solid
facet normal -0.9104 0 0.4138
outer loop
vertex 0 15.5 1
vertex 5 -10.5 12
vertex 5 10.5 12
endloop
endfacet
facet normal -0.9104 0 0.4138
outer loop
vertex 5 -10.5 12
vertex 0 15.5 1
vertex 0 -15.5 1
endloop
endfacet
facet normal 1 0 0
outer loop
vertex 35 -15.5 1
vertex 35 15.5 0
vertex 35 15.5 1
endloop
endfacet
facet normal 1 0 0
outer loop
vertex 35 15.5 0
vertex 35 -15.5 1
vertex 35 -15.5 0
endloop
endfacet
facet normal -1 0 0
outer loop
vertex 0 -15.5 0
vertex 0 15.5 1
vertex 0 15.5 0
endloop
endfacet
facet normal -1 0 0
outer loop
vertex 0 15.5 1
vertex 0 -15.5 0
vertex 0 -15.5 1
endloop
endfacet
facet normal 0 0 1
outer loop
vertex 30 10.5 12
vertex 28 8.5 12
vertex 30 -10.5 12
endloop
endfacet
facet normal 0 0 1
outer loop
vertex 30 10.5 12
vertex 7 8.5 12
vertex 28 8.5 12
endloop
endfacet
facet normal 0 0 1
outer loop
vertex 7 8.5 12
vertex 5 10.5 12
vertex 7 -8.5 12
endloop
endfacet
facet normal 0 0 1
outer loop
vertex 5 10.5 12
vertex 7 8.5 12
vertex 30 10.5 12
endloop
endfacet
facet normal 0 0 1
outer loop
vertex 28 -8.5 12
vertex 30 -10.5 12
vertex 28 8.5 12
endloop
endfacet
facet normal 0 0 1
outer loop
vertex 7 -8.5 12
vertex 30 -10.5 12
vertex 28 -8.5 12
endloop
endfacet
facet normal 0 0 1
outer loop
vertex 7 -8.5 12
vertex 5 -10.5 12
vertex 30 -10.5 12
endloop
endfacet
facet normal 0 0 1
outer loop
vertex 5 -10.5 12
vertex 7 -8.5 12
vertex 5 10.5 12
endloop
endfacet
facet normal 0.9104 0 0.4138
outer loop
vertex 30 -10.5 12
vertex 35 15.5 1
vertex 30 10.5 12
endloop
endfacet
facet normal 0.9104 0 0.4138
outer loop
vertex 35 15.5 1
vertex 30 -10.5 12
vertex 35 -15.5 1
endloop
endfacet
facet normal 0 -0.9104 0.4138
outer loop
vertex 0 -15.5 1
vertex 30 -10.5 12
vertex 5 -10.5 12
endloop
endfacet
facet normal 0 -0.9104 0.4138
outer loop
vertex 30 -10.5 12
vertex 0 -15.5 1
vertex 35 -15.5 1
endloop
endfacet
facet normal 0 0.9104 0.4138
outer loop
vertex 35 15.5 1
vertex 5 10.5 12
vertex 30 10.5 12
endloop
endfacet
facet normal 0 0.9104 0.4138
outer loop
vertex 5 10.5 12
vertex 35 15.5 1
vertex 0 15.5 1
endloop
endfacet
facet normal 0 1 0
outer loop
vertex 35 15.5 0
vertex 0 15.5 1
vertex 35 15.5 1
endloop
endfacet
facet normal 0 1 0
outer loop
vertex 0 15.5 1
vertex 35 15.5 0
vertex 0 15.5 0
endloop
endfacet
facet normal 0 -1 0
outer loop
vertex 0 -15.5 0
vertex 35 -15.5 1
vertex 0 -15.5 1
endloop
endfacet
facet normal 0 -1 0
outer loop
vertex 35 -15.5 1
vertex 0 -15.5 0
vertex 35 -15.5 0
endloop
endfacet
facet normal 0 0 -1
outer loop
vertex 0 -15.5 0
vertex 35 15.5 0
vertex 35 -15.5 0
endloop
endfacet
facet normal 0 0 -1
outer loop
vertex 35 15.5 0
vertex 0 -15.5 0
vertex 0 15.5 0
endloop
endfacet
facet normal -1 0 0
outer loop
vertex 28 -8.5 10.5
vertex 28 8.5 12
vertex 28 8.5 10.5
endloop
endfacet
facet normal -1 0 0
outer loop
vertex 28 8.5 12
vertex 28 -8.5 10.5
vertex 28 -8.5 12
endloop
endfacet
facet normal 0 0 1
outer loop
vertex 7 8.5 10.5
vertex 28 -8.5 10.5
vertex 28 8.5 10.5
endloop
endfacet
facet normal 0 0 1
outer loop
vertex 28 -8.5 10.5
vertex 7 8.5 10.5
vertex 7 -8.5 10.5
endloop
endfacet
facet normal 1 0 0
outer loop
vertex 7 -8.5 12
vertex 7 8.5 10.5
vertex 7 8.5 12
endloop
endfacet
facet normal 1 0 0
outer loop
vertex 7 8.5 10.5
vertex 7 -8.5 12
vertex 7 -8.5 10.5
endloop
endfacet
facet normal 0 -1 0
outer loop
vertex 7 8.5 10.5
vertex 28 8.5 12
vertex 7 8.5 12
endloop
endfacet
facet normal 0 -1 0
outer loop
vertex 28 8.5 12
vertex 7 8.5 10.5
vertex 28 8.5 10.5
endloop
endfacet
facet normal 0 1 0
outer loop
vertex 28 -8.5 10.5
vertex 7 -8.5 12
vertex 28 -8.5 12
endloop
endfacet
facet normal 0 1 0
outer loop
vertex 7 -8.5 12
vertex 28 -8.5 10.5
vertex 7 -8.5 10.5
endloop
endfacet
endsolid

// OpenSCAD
//
// This is a trivial thing for now, not even worth putting into repository.
// But we do it anyway, mostly out of habit.
//

riser_l = 21.0;    // X - inside size
riser_w = 17.0;    // Y - inside size
riser_h = 12.0;    // Z - very tall

// We make the indent just deep enough that the machine rests on the feet,
// not on the surrounding plastic. This isolates vibrations at least somewhat.
// Also, we don't know if the plastic around feet is level or strong enough.
riser_depth =  1.5;

module riser () {
    top_w = riser_w + 4.0;      // Make borders
    top_l = riser_l + 4.0;
    bottom_w = top_w + 10.0;    // Make the pyramid
    bottom_l = top_l + 10.0;

    difference () {
        // The outside pyramid
        hull () {
            translate([(bottom_l - top_l)/2, (top_w/2)*-1, 0])
                cube([top_l, top_w, riser_h]);
            translate([0, (bottom_w/2)*-1, 0])
                cube([bottom_l, bottom_w, 1.0]);
        }
        // The indentation
        translate([(bottom_l - top_l + 4.0)/2, (riser_w/2)*-1,
                    riser_h - riser_depth]) {
            cube([riser_l, riser_w, riser_h + 0.01]);
        }
    }
}

riser();
